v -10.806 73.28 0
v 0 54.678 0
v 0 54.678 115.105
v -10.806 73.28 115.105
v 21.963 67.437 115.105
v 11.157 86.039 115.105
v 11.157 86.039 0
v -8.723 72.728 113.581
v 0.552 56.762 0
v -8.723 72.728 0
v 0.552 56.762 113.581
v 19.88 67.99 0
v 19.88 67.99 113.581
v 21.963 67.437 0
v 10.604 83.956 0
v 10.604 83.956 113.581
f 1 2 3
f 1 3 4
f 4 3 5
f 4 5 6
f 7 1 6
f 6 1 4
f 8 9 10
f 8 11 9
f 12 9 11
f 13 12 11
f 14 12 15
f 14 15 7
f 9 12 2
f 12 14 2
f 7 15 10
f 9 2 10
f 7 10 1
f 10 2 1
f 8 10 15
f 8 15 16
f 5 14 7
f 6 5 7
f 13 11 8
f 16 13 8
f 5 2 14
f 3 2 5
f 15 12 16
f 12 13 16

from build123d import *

# Parameters (mm, degrees)
F1_E2_W  = 21.512664049
F1_E2_H  = 115.1049882174
F3_DEPTH = 25.4
F4_T     = -1.524


with BuildPart() as f3:
    # F1_E2 (on explicit) → F3 (new body)
    with BuildSketch(Plane(origin=(0, 54.6783059835, 0), x_dir=(-0.5023234046, 0.8646798235, 0), z_dir=(0.8646798235, 0.5023234046, 0))):
        with Locations((10.7563320245, 57.5524941087)):
            Rectangle(F1_E2_W, F1_E2_H)
    extrude(amount=F3_DEPTH)

    # F4
    f4_openings = [f3.faces().sort_by_distance(p)[0] for p in [
        (5.578276, 70.358596, 0),
    ]]
    offset(amount=F4_T, openings=f4_openings)


solid = f3.part
